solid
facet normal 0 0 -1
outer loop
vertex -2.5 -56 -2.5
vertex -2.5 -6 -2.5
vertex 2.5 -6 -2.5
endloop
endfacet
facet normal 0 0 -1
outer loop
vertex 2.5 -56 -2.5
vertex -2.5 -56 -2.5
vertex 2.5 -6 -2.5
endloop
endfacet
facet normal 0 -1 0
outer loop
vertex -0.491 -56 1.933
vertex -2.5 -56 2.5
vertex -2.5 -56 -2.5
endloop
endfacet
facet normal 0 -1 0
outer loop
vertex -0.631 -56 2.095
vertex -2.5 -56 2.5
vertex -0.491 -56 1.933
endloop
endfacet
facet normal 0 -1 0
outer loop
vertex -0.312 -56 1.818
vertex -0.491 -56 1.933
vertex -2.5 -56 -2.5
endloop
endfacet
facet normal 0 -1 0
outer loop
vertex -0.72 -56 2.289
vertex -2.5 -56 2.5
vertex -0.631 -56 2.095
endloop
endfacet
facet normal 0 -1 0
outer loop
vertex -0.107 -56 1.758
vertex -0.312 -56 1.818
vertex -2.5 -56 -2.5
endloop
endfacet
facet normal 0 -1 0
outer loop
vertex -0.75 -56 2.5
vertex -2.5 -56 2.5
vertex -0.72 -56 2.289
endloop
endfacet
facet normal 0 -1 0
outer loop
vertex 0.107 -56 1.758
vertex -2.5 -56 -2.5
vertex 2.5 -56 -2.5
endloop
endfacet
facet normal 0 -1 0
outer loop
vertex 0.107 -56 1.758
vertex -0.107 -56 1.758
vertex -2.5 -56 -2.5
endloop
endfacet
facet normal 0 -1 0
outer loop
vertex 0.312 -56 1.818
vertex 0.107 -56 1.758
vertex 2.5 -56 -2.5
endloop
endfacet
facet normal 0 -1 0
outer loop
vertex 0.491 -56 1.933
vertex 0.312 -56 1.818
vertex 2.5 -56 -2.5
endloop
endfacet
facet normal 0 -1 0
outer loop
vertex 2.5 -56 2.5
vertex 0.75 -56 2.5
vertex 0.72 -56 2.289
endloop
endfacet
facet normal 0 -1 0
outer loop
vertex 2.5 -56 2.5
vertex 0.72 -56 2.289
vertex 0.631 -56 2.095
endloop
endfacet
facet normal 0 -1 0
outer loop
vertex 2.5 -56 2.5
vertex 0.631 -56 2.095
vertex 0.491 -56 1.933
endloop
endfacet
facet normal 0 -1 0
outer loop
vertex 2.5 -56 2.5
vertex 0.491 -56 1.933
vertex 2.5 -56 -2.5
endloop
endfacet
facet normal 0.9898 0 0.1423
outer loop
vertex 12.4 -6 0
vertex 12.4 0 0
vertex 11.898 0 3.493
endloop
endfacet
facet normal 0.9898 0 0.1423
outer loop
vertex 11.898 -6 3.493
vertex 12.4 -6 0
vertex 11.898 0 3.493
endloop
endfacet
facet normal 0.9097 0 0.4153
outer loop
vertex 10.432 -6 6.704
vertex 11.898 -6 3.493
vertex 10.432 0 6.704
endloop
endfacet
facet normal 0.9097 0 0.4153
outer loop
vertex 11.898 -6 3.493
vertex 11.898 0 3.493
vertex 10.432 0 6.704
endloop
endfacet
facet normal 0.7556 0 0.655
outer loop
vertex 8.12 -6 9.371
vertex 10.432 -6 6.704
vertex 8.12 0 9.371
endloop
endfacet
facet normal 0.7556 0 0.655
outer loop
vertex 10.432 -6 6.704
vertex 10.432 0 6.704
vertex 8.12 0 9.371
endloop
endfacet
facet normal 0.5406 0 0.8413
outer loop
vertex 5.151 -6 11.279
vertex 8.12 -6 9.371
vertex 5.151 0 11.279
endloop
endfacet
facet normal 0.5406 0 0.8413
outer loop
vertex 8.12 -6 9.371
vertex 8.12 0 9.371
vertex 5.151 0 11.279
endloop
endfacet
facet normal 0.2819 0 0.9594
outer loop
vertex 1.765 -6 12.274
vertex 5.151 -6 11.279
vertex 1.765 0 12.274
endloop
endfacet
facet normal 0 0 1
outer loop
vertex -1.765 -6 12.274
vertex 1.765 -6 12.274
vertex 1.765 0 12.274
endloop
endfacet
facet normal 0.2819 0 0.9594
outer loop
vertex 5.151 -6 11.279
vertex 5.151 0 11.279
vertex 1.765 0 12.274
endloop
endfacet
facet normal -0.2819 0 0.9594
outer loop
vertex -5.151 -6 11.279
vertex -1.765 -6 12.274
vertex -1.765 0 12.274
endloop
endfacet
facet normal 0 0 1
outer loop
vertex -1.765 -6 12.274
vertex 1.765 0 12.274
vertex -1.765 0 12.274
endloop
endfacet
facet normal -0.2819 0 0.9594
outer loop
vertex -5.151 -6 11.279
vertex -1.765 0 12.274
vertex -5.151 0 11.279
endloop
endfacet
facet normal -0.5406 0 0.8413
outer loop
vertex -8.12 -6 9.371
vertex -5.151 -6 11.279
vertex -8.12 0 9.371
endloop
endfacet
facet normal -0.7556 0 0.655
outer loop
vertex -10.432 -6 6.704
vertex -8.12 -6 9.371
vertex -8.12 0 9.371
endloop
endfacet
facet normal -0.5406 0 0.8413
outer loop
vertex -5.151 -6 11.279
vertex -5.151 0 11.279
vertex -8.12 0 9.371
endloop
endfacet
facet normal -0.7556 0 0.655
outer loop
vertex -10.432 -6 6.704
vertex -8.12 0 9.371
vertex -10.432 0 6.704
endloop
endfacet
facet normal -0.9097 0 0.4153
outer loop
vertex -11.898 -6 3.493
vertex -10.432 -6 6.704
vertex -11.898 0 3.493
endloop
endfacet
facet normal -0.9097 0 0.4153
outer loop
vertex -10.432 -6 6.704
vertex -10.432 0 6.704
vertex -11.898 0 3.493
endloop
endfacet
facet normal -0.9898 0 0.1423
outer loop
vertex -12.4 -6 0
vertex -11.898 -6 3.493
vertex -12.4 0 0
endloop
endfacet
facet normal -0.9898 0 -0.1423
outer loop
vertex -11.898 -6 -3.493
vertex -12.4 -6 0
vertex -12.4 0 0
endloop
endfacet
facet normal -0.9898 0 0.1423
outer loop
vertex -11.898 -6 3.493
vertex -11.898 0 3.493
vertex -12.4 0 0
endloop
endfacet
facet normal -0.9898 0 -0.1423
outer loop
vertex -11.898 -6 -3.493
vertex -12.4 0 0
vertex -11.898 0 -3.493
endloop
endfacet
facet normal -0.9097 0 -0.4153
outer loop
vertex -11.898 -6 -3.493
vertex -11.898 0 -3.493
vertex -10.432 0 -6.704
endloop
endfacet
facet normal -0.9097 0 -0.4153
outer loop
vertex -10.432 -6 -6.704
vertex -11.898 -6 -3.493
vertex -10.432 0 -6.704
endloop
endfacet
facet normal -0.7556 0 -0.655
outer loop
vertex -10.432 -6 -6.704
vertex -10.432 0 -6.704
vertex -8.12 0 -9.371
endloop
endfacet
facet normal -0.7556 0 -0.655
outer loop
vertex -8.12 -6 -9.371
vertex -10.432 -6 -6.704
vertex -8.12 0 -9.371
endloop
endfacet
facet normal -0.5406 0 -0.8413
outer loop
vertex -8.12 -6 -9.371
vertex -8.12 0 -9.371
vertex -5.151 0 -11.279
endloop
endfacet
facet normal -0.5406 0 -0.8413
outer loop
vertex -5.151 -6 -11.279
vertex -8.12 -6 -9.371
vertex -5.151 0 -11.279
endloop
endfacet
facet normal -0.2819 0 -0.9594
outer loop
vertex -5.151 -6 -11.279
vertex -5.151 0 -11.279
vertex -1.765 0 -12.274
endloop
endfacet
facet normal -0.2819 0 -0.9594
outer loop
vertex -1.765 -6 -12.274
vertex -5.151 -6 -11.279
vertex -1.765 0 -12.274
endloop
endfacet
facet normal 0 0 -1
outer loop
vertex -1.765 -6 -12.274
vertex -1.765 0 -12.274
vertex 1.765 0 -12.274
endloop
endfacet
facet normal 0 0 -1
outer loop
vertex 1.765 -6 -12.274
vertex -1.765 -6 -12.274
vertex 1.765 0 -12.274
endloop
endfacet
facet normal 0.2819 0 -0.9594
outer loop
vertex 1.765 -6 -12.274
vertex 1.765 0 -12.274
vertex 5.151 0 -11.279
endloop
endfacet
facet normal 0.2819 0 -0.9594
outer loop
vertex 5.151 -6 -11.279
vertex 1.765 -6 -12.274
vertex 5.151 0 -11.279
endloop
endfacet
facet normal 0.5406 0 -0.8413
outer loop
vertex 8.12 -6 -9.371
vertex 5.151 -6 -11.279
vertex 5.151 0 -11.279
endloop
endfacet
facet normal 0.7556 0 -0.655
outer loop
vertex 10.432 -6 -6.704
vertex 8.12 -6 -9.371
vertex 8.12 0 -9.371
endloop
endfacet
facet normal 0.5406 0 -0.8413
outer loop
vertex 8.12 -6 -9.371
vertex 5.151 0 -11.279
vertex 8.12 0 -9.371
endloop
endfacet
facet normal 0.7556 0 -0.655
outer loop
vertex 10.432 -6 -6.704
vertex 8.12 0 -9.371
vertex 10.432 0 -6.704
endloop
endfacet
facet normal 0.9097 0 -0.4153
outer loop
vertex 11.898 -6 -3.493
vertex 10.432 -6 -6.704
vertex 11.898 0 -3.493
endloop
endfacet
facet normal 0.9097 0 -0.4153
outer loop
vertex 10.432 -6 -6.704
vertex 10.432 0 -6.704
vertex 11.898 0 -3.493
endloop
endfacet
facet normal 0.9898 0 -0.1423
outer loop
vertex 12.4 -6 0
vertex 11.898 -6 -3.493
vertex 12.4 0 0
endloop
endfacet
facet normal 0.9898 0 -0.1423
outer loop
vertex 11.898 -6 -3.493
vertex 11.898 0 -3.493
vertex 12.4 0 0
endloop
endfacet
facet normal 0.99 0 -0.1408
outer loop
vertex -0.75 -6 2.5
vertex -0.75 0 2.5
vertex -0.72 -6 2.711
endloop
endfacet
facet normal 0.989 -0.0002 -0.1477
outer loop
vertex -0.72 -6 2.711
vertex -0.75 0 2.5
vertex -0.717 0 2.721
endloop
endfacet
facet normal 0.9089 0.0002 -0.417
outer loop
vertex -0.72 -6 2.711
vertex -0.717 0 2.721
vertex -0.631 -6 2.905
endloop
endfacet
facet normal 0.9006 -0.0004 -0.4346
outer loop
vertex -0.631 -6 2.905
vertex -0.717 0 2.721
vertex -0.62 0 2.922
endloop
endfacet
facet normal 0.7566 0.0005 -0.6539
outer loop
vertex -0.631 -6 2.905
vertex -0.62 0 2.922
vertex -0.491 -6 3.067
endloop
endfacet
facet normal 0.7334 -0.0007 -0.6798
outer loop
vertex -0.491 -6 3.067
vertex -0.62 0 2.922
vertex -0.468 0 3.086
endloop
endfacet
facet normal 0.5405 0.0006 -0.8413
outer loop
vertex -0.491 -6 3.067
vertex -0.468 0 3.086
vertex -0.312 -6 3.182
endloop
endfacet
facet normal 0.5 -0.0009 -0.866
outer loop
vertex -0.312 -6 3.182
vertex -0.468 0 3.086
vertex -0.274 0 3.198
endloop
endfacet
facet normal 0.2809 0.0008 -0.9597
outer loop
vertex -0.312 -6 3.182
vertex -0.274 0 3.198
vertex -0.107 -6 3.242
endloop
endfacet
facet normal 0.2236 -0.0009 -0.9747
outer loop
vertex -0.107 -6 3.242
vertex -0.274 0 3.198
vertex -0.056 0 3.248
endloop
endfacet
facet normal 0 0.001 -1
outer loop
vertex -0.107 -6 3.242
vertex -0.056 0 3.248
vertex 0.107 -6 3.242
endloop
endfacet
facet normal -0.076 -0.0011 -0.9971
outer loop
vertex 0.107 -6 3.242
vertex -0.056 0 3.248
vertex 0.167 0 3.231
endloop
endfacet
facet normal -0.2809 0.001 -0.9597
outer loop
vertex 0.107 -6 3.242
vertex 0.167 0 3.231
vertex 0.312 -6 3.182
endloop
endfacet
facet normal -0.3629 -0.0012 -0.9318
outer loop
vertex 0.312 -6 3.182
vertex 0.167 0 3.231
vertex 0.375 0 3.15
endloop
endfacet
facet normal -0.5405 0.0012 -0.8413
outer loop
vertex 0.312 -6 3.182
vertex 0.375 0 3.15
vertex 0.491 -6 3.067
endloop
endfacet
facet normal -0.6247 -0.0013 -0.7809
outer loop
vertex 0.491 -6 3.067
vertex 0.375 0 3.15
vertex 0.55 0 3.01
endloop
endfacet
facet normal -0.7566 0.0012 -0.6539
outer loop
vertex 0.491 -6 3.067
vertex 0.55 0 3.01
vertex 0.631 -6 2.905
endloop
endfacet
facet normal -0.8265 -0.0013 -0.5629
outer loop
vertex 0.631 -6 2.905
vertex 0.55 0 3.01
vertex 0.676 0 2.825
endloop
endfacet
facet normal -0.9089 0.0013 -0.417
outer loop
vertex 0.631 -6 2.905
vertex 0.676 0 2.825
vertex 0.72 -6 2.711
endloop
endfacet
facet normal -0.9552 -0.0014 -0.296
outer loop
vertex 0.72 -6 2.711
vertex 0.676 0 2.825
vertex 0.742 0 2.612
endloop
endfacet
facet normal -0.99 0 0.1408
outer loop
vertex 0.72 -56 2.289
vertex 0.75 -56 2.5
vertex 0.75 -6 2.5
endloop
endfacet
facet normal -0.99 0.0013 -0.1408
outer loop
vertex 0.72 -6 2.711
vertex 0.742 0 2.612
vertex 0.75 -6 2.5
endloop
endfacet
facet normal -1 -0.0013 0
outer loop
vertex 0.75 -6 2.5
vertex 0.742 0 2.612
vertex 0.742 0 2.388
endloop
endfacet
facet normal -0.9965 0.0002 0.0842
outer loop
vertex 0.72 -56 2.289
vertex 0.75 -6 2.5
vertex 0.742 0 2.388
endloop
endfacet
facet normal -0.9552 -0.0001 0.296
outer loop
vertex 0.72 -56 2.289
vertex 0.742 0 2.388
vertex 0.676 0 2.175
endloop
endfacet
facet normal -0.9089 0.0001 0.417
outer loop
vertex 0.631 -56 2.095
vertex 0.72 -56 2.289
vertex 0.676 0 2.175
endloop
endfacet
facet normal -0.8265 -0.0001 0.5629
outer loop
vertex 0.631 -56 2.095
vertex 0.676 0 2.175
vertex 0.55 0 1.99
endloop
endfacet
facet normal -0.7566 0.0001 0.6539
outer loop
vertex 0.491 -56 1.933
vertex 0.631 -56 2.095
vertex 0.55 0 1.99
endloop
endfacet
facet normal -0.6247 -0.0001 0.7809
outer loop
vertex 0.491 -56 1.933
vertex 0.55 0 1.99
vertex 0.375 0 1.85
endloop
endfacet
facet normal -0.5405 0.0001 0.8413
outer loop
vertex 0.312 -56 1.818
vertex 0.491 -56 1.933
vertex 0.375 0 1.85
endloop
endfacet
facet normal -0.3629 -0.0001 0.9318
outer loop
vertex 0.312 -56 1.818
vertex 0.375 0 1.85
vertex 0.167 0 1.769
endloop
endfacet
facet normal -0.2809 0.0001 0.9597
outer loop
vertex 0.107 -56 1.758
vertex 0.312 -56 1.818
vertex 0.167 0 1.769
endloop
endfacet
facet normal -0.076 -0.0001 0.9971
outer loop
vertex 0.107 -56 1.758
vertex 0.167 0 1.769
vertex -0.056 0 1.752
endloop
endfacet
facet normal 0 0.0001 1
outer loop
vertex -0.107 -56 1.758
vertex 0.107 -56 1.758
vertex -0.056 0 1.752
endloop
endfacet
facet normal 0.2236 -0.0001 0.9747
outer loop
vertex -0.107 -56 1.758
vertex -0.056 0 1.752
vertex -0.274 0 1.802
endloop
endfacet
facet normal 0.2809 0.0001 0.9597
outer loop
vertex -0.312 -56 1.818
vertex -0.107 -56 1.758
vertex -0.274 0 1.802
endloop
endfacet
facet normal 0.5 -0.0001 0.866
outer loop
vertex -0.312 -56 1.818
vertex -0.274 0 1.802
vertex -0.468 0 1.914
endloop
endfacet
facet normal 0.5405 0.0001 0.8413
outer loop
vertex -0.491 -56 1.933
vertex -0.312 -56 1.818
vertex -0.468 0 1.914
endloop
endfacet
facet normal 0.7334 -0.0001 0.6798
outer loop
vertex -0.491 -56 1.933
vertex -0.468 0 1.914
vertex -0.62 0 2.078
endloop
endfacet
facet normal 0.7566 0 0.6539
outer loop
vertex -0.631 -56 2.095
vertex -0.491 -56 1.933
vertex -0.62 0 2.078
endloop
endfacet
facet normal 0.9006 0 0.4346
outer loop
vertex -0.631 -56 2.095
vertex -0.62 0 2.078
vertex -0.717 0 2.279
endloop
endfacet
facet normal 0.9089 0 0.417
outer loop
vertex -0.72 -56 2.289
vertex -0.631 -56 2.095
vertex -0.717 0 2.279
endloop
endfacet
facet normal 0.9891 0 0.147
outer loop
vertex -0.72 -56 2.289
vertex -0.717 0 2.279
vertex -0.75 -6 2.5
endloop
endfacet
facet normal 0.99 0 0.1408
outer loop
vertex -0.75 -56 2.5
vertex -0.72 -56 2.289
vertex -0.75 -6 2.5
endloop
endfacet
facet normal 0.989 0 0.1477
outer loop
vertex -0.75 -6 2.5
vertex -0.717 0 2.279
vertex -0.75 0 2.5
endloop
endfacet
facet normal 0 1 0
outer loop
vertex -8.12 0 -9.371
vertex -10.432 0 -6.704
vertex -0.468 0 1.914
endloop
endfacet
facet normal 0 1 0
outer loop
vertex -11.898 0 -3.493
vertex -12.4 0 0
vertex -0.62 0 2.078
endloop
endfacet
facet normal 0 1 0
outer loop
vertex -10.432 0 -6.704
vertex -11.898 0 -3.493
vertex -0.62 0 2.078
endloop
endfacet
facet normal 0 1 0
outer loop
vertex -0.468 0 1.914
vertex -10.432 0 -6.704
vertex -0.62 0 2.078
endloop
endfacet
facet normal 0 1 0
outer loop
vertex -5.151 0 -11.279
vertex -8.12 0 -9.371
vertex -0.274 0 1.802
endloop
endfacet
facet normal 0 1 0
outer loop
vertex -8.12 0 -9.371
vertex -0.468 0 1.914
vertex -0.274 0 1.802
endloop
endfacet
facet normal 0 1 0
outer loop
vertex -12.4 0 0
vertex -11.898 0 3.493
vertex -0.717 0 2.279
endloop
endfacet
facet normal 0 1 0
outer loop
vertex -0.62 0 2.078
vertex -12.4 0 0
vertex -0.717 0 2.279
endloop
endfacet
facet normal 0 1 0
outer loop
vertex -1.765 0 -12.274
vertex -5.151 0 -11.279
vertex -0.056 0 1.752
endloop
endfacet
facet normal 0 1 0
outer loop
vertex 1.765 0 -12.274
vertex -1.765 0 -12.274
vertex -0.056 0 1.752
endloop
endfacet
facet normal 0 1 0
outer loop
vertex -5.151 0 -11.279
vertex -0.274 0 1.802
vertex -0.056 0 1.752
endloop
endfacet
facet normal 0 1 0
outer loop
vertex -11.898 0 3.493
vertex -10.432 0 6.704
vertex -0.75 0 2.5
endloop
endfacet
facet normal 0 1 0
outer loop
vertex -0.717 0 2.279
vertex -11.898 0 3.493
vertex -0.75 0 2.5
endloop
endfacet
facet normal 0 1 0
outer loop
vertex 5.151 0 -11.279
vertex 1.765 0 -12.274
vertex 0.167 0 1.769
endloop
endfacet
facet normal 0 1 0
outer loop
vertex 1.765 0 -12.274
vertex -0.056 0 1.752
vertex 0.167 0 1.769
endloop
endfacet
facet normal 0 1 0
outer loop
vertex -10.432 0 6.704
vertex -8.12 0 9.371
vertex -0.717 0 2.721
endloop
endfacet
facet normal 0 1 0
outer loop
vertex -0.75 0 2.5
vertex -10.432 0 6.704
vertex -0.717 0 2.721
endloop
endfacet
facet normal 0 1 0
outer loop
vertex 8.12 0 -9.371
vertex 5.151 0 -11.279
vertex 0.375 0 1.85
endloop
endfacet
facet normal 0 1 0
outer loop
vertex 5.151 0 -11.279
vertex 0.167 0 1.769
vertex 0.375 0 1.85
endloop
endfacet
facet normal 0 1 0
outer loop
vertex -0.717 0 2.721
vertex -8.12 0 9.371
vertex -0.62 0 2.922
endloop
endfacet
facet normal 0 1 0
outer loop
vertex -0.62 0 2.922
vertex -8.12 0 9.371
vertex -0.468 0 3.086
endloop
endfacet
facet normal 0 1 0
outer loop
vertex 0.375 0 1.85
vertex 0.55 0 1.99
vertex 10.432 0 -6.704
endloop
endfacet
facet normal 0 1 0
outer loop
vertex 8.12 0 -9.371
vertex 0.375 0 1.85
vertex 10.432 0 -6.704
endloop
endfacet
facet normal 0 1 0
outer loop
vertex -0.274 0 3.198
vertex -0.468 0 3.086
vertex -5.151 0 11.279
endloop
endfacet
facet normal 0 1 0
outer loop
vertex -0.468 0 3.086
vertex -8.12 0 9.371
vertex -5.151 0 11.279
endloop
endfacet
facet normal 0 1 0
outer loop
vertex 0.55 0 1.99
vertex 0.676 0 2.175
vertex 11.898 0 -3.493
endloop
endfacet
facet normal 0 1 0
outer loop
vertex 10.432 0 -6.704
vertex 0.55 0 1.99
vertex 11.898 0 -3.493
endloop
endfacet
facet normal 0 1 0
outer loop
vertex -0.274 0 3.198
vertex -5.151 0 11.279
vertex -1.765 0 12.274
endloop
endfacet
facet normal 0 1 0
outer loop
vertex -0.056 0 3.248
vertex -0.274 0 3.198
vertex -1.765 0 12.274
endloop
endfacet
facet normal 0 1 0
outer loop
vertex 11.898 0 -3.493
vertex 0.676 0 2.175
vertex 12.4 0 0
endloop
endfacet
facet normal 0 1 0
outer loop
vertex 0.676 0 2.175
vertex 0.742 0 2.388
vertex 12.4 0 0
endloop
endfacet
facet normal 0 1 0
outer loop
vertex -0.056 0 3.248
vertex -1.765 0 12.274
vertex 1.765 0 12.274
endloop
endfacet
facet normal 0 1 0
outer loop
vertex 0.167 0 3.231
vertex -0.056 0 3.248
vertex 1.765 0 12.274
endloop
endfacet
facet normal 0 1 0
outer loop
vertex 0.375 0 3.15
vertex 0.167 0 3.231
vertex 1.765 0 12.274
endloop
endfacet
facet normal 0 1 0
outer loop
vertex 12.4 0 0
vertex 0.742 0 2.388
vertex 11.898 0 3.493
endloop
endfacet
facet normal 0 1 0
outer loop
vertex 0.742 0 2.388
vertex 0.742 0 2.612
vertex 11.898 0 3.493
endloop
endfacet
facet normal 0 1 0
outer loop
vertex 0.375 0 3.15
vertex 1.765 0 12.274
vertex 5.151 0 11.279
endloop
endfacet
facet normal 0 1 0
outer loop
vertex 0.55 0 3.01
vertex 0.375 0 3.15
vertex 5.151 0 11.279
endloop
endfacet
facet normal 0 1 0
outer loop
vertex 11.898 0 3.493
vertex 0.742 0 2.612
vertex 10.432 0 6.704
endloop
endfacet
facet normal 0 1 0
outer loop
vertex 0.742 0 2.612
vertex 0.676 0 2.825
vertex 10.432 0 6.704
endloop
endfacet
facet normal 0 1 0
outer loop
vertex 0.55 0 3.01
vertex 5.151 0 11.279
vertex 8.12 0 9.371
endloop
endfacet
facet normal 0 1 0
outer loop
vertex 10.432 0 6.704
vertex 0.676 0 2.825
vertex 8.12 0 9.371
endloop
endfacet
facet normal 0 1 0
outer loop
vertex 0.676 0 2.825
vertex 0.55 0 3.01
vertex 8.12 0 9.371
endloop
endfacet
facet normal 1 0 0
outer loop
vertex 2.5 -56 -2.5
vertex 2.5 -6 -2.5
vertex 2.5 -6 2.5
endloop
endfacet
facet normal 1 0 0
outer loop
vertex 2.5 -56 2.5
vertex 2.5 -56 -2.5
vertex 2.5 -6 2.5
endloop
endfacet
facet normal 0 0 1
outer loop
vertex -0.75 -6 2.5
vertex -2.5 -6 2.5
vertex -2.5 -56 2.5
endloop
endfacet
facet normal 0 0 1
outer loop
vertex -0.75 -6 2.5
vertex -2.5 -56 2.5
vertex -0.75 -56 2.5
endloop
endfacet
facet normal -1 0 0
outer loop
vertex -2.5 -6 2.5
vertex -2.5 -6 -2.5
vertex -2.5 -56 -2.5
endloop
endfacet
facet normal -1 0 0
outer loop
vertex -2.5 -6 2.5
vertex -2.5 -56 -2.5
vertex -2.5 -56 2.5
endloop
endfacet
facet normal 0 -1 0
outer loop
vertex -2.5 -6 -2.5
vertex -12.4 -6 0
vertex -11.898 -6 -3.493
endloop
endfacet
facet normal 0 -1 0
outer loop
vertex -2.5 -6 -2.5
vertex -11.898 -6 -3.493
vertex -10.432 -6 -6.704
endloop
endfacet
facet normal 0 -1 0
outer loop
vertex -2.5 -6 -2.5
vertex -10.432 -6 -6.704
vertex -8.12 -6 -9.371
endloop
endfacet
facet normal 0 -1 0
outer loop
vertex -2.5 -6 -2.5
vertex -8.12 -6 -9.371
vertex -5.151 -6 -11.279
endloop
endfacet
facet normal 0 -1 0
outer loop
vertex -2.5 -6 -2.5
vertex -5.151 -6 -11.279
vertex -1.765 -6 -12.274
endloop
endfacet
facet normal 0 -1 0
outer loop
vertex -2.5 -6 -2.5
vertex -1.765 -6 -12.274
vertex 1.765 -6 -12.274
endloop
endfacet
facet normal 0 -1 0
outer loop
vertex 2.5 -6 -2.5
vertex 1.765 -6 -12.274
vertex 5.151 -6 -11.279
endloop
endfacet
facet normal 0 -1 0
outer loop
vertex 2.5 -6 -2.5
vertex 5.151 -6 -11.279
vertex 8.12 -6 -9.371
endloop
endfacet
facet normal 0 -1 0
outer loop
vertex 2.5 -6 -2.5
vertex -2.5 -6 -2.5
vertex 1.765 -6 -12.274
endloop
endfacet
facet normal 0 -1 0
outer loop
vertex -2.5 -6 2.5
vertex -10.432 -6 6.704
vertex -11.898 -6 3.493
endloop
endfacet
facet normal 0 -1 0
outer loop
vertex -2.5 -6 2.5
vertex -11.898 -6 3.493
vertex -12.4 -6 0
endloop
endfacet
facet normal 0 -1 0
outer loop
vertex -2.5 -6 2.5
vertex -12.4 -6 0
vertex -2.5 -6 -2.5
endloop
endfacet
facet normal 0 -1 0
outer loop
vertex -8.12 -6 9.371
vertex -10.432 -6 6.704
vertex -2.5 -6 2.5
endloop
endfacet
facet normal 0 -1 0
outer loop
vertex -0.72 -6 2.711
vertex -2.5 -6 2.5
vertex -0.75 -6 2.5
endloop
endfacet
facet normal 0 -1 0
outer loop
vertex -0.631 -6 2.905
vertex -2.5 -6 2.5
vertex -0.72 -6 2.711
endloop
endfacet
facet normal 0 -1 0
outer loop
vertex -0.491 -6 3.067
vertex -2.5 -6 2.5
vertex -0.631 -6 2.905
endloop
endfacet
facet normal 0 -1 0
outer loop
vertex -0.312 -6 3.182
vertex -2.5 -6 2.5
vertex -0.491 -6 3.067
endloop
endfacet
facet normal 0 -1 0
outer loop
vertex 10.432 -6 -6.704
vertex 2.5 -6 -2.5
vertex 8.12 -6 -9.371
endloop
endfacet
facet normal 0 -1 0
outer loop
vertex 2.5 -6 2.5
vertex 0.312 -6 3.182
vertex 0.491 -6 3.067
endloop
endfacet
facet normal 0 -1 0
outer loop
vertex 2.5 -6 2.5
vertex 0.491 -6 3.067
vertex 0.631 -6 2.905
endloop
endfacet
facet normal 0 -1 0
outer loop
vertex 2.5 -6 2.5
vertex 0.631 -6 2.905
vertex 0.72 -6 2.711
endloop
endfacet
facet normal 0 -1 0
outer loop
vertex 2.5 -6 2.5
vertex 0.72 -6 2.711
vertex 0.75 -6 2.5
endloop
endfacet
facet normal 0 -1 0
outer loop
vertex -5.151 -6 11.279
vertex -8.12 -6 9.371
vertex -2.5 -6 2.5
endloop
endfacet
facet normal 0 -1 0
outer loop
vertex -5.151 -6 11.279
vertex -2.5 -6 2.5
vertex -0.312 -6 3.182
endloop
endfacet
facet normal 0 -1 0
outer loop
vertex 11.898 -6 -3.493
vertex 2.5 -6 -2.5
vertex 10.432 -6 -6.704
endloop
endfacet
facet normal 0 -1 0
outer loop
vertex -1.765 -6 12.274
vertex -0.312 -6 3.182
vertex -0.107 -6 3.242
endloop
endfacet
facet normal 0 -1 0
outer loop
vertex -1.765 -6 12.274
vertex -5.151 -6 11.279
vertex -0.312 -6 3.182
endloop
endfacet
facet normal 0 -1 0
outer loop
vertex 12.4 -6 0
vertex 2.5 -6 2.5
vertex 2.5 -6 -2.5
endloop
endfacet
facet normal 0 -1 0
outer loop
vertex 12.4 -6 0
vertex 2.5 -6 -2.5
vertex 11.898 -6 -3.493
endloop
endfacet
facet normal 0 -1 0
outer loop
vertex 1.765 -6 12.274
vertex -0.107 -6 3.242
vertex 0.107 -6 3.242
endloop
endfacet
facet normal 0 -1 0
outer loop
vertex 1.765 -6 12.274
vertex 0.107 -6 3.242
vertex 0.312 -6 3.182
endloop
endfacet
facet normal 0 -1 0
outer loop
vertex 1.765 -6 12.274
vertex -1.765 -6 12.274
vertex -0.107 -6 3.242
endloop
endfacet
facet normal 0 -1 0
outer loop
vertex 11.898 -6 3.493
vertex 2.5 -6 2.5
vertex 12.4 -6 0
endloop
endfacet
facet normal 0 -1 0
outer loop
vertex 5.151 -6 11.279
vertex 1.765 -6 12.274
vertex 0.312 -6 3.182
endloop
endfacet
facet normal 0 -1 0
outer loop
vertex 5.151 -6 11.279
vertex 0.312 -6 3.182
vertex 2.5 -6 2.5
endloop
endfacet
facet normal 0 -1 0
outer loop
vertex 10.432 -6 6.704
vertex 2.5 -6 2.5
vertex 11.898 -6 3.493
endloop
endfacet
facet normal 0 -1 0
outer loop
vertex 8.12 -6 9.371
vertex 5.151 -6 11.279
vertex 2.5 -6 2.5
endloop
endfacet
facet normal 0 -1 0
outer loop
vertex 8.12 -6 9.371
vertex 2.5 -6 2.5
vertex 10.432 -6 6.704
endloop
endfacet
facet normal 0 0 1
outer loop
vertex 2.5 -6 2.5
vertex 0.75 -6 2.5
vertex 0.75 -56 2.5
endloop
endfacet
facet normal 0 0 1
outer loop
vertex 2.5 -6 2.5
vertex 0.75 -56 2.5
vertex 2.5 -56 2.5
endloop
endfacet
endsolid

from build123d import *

# Parameters (mm, degrees)
F0_R     = 12.4
F1_DEPTH = 6
F2_W     = 5
F2_H     = 5
F3_DEPTH = 50
F4_R     = 0.75
F5_DEPTH = 60


with BuildPart() as f1:
    # F0 (on Front) → F1 (new body)
    with BuildSketch(Plane.XZ):
        Circle(F0_R)
    extrude(amount=F1_DEPTH)

    # F2 (on face) → F3 (join)
    with BuildSketch(Plane.XZ.offset(6)):
        Rectangle(F2_W, F2_H)
    extrude(amount=F3_DEPTH)

    # F4 (on face) → F5 (cut)
    with BuildSketch(Plane(origin=(0, 0, 0), x_dir=(-1, 0, 0), z_dir=(0, 1, 0))):
        with Locations((0, 2.5)):
            Circle(F4_R)
    extrude(amount=-F5_DEPTH, mode=Mode.SUBTRACT)


solid = f1.part
